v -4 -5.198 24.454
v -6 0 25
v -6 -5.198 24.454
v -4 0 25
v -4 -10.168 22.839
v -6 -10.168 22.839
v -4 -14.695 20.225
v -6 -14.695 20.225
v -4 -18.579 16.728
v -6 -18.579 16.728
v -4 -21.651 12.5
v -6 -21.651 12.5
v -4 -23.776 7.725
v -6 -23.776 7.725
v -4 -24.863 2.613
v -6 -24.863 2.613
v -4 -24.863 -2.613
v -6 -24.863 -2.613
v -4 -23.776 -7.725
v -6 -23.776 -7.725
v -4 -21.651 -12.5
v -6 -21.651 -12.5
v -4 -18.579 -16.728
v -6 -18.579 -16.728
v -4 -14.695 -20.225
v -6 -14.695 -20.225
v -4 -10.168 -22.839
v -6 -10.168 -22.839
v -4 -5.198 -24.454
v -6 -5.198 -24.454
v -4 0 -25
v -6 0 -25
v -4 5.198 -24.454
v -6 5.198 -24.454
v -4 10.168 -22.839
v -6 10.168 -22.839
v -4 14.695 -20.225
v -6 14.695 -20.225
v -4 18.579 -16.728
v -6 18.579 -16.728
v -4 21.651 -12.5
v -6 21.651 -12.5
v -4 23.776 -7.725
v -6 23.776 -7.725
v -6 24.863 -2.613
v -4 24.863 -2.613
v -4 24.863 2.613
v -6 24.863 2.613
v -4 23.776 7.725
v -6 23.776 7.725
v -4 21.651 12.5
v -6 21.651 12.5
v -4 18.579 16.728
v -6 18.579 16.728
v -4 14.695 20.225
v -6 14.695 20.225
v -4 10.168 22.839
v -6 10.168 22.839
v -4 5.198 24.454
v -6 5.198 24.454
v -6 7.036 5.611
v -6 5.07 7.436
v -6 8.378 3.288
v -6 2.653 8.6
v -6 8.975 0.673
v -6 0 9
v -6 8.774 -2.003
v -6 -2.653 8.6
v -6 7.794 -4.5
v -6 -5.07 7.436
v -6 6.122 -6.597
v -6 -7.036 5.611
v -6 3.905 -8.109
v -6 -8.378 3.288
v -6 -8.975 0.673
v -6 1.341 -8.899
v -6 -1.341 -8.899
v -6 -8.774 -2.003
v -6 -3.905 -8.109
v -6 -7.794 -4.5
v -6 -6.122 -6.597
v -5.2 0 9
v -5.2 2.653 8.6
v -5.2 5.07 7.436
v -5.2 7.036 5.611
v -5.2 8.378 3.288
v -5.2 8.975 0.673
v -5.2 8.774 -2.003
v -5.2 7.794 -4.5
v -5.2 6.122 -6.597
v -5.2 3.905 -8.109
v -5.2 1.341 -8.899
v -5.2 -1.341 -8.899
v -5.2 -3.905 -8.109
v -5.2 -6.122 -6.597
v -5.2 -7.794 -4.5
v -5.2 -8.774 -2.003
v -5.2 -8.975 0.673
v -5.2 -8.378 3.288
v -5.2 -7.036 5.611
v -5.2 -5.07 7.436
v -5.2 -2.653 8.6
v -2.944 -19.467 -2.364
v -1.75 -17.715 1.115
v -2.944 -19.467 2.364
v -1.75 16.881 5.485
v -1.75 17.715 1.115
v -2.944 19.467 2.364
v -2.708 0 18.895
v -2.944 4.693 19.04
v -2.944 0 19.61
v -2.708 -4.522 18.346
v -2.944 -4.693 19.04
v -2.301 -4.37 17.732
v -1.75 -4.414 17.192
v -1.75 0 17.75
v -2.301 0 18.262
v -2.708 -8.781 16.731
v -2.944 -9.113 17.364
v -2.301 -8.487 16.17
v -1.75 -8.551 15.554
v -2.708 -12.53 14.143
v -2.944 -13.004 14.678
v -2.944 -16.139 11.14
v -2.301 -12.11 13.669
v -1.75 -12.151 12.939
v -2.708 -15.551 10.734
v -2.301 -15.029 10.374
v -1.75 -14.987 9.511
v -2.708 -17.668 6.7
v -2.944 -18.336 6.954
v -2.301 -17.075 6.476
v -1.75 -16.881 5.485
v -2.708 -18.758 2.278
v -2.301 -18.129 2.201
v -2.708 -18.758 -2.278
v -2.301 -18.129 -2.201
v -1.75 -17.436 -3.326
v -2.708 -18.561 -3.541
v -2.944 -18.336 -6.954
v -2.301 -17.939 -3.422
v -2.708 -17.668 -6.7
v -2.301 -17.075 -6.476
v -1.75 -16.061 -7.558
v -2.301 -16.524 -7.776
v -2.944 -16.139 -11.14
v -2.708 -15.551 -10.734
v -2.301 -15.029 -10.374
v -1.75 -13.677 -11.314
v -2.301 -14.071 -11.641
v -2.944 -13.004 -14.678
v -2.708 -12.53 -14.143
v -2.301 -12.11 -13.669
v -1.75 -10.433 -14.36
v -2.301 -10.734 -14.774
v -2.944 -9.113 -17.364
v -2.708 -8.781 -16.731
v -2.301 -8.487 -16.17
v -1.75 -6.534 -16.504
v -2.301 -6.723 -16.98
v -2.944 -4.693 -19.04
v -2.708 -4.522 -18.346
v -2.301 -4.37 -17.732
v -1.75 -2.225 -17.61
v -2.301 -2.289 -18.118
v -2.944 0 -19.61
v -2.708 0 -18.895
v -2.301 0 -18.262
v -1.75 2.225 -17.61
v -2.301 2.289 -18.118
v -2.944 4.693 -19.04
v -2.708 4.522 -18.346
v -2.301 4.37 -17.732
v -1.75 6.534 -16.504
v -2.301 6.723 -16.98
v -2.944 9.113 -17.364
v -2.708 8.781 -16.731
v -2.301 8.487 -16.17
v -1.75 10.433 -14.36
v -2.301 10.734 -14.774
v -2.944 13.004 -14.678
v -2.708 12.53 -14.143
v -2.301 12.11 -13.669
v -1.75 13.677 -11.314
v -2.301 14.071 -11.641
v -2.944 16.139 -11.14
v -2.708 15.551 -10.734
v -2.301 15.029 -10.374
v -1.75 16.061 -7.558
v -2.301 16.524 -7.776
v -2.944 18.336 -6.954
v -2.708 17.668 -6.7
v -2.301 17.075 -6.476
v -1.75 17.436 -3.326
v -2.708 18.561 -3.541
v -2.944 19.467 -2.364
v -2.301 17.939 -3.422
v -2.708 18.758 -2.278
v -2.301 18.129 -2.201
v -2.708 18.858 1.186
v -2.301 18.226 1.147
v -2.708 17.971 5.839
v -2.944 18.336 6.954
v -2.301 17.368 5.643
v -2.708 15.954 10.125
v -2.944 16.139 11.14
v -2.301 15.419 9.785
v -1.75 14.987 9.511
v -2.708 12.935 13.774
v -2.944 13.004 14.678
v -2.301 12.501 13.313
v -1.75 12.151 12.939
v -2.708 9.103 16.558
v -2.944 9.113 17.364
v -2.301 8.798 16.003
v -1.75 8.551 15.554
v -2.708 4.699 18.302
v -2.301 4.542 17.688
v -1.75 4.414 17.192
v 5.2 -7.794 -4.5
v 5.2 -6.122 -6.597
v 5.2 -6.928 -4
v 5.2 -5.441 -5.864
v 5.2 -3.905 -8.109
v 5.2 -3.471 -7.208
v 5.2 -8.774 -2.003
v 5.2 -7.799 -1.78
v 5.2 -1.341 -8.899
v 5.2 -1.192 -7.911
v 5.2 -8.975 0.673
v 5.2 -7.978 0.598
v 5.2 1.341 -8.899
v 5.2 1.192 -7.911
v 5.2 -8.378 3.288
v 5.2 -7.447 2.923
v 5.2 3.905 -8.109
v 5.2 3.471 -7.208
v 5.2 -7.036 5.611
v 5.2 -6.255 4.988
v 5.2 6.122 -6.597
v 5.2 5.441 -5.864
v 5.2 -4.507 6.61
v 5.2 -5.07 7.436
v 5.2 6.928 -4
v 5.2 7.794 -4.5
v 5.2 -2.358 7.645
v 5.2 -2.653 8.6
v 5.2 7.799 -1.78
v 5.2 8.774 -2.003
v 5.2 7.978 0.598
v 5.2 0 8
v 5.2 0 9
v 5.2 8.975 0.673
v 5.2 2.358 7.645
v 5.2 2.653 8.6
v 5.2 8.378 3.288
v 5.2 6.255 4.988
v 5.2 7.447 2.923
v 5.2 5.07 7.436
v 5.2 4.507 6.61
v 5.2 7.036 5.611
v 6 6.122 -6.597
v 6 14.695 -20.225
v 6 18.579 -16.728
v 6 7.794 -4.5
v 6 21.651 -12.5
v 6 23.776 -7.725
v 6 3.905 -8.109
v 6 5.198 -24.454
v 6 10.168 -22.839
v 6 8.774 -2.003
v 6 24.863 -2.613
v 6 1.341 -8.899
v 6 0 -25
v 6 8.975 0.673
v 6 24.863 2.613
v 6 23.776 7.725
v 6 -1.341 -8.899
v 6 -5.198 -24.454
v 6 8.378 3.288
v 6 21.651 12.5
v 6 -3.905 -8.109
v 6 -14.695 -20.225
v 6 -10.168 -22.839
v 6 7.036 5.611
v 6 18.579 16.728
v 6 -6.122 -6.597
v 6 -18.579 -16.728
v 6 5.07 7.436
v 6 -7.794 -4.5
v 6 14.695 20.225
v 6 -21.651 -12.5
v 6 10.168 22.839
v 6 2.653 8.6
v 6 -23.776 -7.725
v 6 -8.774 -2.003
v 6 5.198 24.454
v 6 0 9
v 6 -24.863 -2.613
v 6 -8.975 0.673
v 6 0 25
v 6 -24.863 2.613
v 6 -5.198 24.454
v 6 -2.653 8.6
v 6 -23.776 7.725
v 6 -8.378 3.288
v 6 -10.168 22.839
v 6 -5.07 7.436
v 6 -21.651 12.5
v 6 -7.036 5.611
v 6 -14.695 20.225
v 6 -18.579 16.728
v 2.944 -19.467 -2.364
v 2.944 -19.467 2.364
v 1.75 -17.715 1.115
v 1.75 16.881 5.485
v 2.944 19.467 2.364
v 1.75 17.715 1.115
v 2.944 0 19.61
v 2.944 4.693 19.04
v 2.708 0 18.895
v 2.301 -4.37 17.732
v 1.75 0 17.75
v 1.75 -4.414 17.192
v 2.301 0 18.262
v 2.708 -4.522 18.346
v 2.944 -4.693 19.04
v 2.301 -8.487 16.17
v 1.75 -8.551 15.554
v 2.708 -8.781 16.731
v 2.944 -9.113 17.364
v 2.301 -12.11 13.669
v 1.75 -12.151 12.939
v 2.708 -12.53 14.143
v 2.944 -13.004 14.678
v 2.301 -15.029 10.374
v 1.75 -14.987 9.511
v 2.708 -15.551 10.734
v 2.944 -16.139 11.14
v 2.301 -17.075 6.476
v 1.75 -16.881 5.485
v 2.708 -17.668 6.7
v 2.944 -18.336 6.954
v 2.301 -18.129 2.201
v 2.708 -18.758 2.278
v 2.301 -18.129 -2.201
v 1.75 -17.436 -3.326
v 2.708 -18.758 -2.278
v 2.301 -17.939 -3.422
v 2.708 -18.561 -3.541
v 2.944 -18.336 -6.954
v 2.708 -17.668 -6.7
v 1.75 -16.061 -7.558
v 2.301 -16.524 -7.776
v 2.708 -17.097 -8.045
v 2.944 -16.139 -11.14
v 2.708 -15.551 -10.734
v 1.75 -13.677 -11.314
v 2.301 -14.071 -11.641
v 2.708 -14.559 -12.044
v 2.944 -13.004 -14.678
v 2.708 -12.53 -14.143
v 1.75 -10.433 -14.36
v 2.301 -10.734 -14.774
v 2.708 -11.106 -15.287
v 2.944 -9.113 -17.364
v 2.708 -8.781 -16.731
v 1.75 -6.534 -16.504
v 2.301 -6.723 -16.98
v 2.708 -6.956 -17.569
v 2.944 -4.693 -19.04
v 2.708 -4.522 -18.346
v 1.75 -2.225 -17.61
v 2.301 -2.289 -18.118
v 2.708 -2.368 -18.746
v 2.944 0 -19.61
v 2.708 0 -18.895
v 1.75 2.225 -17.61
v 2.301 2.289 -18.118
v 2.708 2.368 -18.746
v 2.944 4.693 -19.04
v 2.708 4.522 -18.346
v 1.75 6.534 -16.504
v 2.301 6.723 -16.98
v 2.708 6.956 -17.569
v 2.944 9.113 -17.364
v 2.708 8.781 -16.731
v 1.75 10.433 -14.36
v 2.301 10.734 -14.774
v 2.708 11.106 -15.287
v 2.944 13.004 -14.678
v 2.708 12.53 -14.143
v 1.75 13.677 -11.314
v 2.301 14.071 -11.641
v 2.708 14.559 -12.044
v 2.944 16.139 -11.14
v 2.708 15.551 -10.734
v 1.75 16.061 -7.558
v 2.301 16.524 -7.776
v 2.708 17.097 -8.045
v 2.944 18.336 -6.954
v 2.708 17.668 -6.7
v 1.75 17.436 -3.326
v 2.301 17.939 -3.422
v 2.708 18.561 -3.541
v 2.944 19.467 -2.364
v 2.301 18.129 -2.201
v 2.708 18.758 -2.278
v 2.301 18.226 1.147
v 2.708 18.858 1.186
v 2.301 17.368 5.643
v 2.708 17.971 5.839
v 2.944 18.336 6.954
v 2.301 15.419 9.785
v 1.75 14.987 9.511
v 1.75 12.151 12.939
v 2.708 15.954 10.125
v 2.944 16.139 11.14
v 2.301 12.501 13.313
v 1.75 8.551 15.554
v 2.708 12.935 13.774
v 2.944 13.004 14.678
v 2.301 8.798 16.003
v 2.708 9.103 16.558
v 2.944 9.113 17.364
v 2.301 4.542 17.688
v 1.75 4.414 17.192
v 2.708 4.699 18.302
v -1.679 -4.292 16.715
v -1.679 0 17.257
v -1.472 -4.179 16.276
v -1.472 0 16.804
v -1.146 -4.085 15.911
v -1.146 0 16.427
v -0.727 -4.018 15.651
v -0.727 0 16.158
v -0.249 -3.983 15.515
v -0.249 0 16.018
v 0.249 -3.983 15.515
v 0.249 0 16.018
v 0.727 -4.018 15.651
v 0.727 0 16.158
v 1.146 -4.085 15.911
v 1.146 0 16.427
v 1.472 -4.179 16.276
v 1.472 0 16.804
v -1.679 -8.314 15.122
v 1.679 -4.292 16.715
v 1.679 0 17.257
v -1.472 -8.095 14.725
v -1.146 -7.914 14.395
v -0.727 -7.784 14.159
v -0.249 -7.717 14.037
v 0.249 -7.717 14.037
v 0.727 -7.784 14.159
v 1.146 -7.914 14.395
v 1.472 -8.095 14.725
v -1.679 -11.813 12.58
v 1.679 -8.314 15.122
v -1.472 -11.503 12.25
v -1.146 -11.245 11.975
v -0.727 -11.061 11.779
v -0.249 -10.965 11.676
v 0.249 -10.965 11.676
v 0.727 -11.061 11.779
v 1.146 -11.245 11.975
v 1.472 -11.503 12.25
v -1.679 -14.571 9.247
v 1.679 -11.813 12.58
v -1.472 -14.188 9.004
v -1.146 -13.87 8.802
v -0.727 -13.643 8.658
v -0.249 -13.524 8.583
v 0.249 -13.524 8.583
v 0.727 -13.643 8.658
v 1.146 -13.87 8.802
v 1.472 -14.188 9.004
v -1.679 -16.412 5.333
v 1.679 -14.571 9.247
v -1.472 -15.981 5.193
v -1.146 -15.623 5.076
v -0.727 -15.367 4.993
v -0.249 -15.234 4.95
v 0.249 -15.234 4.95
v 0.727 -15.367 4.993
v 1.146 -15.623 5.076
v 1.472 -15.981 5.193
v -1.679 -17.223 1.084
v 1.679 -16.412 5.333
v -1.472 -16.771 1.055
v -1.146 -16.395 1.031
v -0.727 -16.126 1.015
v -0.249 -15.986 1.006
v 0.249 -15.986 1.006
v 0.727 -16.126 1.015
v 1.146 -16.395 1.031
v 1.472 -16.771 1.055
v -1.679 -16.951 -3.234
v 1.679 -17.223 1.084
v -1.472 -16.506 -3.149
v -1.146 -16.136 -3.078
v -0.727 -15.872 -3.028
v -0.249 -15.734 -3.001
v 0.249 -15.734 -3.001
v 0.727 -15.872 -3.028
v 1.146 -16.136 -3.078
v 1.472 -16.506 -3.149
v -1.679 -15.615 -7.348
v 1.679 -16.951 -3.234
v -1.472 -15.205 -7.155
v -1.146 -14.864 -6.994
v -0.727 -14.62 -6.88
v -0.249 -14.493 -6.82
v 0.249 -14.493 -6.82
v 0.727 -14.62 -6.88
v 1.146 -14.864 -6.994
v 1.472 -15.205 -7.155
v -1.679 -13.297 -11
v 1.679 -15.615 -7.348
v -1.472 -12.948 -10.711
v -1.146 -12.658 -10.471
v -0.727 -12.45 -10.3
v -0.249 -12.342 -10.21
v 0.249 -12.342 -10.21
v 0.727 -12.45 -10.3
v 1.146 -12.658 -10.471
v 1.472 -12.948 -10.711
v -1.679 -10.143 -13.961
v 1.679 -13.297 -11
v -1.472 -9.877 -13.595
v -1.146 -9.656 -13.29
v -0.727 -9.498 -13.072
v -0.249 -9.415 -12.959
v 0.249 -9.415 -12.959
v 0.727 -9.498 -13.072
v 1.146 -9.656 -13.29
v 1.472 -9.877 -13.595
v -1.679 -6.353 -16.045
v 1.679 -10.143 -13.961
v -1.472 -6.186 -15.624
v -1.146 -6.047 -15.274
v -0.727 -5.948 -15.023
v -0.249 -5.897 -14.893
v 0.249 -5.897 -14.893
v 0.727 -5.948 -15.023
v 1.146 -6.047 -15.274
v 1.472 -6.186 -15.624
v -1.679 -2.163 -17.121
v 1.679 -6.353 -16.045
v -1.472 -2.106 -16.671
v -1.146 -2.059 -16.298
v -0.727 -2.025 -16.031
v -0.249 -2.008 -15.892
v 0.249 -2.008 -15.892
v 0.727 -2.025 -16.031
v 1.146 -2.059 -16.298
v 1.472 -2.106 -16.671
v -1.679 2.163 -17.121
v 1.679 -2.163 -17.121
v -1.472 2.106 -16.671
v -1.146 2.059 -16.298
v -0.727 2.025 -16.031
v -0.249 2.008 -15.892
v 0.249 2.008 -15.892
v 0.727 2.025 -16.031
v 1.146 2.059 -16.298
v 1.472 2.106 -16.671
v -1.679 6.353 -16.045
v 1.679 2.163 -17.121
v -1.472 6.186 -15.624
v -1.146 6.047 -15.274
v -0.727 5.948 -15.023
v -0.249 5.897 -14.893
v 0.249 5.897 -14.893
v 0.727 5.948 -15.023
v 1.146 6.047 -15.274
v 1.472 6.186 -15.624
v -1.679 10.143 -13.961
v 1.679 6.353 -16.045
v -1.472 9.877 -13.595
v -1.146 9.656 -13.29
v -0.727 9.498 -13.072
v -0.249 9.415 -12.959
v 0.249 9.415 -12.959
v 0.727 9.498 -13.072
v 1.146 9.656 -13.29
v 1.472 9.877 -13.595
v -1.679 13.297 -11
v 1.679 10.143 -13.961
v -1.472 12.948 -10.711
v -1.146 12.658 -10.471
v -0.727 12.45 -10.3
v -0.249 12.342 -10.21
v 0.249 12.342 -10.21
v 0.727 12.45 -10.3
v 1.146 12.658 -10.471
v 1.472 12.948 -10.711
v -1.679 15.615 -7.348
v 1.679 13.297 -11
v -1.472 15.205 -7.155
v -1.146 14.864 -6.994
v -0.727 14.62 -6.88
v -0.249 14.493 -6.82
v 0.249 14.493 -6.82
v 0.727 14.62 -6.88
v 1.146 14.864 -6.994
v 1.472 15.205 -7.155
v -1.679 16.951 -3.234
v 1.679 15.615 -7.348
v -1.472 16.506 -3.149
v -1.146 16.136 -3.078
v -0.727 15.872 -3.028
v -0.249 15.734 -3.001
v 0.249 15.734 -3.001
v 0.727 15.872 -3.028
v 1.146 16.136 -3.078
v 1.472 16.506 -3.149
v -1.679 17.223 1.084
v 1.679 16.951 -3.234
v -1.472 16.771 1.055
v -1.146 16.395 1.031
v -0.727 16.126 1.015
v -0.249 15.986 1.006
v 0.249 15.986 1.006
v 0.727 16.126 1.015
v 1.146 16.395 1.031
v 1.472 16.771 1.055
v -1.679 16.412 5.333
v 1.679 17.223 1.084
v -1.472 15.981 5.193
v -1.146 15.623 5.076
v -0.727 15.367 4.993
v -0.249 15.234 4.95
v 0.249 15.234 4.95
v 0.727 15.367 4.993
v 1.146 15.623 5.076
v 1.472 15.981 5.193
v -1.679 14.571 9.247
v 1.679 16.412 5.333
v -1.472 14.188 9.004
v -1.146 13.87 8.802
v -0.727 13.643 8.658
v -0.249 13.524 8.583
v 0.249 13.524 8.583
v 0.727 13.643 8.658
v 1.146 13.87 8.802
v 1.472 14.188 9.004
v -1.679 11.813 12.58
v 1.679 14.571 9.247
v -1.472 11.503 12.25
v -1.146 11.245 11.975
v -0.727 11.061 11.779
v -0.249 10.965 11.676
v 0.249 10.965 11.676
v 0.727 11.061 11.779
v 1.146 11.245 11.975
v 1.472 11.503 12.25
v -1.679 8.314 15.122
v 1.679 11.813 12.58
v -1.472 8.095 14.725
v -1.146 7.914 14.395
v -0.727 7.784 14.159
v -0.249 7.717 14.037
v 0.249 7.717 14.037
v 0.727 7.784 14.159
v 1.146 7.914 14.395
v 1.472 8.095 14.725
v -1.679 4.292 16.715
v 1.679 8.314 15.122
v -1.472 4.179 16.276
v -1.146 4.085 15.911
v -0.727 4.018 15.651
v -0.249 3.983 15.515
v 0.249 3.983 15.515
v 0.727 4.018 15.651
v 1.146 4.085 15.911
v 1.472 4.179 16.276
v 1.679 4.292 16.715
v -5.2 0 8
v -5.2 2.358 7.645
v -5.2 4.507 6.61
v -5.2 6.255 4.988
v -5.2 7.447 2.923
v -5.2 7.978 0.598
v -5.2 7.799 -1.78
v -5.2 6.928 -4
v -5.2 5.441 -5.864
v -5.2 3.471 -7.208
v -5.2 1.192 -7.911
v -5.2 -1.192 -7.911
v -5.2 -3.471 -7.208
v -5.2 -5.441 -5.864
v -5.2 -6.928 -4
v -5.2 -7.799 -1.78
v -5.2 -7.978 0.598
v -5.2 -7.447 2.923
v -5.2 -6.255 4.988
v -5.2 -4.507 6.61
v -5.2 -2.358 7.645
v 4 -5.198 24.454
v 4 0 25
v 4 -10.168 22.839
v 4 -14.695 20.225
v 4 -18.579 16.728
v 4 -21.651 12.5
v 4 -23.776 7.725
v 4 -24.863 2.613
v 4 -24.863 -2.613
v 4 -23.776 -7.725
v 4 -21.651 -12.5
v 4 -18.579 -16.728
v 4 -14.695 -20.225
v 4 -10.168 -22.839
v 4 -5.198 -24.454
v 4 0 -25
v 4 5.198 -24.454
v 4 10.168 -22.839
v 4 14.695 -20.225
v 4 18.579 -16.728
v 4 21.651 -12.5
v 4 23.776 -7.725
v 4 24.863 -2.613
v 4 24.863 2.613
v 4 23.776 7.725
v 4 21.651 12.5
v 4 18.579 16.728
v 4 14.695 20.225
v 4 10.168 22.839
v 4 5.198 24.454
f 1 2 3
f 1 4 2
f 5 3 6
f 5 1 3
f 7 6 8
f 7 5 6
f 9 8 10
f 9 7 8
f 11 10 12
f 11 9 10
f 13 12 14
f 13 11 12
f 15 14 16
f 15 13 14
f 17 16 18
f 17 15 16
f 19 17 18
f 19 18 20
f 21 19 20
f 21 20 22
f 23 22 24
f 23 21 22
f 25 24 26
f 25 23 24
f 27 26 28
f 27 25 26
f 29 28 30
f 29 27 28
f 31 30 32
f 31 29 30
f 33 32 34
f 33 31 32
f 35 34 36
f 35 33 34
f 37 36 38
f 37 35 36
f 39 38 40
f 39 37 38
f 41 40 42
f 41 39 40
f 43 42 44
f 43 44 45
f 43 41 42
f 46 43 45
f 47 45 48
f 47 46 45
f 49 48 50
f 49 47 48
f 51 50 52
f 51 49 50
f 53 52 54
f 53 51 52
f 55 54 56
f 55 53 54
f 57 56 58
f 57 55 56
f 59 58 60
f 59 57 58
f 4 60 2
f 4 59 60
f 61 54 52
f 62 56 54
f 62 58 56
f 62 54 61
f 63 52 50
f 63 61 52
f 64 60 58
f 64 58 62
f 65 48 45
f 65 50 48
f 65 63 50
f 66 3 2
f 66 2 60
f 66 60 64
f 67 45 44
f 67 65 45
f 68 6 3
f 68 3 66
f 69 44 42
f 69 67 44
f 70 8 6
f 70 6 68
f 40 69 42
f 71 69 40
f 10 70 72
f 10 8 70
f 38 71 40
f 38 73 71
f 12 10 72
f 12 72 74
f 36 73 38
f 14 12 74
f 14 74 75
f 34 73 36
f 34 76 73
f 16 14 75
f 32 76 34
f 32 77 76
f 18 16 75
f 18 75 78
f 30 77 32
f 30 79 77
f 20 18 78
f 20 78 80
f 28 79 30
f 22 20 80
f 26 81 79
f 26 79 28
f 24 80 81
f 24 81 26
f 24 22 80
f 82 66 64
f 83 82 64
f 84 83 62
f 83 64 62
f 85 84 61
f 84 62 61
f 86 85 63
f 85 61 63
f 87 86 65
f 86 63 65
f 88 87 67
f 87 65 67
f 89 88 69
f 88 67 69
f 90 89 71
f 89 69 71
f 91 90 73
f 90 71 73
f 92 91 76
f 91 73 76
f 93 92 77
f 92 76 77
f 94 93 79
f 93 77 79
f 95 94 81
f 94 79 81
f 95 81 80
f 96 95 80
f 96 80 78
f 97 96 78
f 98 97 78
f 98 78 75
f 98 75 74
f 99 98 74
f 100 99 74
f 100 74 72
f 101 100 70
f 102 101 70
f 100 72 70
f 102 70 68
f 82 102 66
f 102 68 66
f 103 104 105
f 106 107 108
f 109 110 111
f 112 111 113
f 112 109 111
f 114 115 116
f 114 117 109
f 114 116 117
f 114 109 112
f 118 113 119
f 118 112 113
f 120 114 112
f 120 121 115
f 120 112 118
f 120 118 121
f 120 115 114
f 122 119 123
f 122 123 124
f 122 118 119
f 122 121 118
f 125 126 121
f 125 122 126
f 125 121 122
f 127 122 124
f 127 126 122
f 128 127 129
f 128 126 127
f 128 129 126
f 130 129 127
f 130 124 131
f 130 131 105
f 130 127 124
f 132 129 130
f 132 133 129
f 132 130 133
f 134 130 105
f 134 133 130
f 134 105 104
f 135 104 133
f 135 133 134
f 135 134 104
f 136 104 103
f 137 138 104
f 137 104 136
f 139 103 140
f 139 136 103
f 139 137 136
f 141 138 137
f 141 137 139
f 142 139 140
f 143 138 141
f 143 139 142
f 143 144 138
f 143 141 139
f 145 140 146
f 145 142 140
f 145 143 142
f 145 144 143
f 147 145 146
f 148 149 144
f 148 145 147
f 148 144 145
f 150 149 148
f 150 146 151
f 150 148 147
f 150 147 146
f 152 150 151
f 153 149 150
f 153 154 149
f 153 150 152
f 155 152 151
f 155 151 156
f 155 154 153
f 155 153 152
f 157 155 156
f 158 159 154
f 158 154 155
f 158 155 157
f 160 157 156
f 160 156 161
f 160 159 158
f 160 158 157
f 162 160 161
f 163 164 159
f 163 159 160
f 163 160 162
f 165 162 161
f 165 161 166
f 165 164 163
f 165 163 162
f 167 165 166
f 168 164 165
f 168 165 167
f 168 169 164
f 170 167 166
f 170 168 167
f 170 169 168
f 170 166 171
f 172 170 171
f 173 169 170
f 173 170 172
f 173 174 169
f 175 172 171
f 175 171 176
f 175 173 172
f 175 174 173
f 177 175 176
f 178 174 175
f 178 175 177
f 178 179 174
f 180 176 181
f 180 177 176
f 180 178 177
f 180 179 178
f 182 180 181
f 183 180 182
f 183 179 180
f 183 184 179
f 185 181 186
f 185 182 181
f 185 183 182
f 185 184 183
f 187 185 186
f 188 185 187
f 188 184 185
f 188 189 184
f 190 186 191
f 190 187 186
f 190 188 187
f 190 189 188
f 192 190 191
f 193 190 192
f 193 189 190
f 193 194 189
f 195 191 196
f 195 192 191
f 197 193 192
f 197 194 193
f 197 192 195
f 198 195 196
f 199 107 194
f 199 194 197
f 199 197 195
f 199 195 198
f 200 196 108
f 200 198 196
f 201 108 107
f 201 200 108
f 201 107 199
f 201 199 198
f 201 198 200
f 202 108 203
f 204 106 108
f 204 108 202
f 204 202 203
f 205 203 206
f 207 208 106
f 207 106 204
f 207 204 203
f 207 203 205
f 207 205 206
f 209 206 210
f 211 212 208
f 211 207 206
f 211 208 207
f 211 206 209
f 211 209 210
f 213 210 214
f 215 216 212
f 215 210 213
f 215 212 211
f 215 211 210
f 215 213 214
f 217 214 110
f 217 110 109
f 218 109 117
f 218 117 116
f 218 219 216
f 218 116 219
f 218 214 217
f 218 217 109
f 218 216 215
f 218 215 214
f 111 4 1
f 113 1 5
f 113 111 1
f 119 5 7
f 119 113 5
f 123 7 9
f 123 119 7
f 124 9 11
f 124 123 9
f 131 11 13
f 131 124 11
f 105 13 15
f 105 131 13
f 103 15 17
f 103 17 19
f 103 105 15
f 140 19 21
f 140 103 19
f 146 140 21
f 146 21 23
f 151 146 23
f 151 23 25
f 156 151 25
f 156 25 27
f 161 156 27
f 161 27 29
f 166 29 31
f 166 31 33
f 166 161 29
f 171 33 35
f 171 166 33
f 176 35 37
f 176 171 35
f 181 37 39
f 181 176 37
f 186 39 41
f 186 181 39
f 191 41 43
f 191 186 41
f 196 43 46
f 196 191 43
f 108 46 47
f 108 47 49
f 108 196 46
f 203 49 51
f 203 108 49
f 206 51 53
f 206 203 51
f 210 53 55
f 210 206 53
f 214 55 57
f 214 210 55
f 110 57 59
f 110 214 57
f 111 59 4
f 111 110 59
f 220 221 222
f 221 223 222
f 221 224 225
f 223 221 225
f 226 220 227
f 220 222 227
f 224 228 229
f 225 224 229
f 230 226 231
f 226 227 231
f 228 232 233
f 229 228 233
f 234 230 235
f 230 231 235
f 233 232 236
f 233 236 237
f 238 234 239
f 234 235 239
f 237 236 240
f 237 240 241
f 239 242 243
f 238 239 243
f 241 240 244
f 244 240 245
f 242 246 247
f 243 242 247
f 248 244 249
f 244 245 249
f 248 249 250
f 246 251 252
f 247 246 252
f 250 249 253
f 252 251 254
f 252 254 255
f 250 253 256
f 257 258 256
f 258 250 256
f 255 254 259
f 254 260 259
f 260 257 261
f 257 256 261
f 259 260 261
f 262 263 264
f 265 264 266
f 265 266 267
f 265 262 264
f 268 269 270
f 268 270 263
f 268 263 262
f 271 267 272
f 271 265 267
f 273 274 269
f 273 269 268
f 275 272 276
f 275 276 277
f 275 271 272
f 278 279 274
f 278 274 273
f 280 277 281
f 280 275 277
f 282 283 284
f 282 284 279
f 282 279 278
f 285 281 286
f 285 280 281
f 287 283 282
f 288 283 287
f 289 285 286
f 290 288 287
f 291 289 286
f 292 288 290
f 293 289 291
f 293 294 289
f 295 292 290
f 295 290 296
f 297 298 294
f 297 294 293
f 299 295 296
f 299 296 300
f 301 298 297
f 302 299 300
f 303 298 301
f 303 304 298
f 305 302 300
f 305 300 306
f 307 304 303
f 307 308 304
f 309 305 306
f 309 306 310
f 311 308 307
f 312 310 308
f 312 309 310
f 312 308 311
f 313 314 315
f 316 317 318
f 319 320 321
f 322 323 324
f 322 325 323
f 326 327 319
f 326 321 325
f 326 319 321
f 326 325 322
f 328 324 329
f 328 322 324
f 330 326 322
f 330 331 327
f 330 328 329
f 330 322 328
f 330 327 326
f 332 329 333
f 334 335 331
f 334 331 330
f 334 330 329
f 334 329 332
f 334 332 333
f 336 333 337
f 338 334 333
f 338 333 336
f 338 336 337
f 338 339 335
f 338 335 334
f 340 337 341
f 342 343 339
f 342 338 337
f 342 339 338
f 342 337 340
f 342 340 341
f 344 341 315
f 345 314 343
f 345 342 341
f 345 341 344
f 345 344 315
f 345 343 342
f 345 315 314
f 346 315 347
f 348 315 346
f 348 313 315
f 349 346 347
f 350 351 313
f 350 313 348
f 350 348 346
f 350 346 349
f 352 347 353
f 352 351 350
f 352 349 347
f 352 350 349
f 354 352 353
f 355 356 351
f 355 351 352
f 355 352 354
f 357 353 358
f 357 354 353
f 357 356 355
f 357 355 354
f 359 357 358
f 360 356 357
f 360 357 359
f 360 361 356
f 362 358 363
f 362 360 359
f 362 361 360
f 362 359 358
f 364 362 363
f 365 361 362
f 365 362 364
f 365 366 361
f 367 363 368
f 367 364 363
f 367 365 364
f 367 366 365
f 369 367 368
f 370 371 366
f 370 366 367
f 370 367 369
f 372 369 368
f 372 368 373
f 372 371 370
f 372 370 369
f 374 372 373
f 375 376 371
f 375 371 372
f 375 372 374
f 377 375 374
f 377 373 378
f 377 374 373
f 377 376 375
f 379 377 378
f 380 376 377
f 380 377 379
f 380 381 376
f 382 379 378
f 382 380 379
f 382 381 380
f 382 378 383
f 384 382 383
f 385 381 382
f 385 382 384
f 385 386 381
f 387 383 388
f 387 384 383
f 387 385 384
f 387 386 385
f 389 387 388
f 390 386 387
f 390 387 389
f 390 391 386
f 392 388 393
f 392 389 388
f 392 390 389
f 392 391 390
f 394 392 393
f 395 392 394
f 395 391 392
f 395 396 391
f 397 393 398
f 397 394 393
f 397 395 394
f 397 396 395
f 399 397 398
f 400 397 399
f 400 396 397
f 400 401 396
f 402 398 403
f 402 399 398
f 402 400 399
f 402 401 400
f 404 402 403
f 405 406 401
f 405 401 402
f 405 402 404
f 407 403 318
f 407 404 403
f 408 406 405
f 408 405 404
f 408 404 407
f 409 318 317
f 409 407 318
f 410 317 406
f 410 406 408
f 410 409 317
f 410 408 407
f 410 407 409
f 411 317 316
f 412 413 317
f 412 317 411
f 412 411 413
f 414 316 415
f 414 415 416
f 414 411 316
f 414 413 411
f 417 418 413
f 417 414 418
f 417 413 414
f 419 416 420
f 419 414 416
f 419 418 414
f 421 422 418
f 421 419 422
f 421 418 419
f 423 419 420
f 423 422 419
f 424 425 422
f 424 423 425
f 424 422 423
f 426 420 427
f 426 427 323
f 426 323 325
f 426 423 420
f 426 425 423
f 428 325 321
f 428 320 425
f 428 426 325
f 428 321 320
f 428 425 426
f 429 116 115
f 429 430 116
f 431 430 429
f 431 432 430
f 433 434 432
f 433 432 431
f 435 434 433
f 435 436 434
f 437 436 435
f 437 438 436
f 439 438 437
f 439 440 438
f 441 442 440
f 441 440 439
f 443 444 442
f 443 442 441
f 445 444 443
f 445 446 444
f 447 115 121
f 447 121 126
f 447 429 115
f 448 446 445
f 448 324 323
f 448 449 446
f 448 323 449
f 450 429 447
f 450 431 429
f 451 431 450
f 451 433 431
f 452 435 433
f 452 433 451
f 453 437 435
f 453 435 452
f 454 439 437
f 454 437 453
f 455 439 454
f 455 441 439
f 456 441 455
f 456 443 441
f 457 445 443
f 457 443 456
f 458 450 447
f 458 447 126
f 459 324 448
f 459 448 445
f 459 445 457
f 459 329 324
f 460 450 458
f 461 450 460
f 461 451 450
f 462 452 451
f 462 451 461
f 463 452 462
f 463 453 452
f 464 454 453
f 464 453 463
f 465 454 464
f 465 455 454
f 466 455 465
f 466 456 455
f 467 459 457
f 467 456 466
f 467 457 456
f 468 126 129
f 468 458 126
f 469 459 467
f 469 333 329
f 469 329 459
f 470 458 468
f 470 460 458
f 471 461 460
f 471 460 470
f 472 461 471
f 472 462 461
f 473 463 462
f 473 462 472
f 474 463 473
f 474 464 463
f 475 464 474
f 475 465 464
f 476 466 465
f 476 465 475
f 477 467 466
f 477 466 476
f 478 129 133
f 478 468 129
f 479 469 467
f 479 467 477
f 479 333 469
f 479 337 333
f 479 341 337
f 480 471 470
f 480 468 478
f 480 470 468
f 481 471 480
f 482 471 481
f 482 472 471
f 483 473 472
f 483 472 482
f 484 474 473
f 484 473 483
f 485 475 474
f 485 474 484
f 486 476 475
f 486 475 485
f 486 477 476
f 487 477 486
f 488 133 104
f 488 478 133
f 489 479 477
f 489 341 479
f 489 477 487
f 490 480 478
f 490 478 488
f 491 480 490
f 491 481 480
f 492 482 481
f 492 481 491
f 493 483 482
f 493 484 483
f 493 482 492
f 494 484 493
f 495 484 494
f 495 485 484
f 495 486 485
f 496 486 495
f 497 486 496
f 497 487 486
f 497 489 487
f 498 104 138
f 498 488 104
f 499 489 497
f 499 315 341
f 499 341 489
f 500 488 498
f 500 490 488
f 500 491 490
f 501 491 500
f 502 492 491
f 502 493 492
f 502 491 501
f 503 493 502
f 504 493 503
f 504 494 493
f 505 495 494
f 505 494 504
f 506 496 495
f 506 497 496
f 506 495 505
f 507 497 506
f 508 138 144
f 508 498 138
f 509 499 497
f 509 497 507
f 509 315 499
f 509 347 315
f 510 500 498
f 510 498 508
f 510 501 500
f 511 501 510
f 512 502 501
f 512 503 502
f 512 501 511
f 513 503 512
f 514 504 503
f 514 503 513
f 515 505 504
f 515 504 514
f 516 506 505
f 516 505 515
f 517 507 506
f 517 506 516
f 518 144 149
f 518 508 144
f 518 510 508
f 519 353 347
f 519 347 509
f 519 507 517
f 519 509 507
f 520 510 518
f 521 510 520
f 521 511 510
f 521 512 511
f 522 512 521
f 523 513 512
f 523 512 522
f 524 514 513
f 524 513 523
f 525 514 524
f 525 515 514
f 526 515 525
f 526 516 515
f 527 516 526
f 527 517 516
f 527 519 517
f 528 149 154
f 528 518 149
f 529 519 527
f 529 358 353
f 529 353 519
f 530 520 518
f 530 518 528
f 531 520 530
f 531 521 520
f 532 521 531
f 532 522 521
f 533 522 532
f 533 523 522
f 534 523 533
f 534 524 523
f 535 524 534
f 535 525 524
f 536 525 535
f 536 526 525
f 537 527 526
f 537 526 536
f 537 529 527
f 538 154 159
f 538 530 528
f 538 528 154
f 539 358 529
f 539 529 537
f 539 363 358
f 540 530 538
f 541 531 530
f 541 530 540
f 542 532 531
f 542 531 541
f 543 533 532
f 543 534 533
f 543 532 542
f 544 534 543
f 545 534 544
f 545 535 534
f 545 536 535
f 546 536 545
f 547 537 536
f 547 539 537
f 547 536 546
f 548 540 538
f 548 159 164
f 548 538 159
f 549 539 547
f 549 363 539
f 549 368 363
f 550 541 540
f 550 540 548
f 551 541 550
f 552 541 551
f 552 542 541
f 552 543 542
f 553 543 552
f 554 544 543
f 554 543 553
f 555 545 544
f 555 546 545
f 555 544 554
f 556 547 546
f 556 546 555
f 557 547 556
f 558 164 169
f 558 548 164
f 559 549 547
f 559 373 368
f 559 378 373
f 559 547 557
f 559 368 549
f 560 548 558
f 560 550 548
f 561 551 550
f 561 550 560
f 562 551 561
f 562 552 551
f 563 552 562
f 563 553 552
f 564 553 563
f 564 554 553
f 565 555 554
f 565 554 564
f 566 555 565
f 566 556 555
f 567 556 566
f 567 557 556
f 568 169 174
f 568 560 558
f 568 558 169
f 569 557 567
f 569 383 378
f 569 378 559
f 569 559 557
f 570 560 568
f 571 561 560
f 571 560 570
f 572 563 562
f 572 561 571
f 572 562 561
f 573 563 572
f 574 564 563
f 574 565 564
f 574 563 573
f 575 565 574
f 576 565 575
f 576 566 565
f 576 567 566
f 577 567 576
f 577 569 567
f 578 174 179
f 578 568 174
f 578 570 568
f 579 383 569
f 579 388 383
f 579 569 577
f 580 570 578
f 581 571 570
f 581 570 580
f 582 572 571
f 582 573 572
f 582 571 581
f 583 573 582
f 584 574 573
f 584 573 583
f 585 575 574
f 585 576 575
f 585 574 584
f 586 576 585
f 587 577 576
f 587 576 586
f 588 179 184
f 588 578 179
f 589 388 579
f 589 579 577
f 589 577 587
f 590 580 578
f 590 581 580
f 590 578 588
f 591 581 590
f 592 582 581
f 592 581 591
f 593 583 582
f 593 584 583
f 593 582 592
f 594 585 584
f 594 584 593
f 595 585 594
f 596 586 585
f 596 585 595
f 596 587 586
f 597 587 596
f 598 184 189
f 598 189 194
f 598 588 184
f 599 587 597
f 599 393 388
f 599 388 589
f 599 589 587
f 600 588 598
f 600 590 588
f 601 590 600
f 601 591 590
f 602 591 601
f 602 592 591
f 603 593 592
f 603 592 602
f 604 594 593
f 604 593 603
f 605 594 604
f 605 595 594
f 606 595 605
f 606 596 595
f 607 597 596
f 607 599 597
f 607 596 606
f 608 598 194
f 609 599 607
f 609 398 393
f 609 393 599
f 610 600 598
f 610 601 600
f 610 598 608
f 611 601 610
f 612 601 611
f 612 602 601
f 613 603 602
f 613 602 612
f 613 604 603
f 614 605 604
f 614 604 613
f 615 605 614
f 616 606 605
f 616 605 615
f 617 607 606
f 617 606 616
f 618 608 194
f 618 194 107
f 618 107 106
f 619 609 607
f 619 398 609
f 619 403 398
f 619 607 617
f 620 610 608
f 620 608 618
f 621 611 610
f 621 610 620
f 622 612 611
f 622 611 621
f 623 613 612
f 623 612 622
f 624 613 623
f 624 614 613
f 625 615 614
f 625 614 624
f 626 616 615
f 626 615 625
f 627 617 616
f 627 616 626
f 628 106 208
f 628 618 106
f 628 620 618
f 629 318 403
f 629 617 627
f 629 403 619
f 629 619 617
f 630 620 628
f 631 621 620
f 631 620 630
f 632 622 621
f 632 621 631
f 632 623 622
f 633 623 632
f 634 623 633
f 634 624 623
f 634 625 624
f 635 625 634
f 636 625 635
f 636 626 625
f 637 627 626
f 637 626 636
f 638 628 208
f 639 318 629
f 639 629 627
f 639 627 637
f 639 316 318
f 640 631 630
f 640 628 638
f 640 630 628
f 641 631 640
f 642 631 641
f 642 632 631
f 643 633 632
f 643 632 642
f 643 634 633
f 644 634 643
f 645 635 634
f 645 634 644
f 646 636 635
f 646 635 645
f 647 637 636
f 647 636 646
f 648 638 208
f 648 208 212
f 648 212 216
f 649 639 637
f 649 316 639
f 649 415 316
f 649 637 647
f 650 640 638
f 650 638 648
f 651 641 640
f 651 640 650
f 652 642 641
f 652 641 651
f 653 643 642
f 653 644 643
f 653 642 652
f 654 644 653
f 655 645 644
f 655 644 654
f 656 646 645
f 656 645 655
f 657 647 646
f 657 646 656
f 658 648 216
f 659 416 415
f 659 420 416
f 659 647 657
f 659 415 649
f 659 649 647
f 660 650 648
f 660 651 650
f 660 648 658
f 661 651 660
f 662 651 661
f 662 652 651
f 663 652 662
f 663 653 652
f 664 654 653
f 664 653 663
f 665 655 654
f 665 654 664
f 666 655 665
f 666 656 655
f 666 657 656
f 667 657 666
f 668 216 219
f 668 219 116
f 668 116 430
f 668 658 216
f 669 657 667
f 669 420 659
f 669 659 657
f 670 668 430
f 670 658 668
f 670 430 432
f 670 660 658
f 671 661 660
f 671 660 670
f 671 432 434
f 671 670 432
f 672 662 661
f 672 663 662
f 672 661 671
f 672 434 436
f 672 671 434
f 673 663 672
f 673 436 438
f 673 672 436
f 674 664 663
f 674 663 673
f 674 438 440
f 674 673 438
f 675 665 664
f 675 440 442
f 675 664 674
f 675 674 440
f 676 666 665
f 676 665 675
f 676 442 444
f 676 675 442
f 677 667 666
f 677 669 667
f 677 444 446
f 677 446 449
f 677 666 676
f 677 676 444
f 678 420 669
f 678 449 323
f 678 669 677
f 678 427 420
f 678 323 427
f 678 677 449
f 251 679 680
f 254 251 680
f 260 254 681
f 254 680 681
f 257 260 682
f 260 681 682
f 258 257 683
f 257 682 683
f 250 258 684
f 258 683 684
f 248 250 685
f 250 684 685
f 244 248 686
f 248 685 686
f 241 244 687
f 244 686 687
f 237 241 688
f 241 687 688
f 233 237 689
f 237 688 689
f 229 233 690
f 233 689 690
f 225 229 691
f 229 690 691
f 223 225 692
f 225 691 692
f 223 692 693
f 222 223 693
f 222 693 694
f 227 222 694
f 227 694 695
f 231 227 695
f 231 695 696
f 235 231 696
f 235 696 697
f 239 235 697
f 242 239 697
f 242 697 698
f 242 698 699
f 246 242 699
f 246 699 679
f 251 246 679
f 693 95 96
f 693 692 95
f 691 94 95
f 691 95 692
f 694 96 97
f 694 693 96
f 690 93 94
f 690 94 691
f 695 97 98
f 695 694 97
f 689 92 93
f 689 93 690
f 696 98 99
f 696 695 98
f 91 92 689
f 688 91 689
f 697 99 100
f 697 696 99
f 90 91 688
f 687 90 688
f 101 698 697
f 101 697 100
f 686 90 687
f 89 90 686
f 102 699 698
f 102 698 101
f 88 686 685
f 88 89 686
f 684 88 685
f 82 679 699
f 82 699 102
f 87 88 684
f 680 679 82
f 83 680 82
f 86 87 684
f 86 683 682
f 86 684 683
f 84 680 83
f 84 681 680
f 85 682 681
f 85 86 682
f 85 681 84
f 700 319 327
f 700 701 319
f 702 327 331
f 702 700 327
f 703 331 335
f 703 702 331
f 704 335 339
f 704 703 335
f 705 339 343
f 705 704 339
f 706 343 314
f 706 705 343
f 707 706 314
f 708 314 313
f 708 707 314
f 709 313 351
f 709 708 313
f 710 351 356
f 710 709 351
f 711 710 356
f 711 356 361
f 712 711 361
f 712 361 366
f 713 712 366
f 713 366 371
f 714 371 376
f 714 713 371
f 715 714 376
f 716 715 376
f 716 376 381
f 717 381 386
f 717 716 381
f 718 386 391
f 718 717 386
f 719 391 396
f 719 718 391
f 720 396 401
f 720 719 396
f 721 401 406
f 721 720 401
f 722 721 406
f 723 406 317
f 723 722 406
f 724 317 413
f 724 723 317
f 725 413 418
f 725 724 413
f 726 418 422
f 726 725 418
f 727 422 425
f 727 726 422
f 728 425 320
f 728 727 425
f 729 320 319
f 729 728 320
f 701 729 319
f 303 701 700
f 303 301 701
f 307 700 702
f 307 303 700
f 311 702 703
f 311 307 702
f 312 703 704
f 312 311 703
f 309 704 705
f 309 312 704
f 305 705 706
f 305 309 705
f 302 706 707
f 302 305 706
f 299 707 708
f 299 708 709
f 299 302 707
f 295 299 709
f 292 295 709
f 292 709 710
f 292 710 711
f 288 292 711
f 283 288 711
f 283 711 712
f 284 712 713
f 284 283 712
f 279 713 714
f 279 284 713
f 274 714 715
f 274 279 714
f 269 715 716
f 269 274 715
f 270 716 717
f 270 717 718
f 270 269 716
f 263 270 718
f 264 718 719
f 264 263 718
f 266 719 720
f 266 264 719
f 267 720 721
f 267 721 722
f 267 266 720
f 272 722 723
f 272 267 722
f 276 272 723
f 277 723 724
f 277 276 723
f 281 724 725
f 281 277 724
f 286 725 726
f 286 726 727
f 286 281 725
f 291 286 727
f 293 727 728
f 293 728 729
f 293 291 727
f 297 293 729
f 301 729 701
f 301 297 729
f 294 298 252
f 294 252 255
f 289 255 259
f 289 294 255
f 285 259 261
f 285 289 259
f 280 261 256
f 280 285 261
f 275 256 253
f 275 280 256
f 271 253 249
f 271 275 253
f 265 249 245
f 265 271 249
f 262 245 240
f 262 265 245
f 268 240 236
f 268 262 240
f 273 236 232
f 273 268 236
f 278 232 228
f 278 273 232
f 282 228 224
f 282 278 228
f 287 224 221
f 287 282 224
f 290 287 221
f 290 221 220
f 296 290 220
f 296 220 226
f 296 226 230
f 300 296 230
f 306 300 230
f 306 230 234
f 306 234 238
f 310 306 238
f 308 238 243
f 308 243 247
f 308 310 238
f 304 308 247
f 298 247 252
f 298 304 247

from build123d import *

# Parameters (mm, degrees)
SKETCH_4_R          = 8
CUT_EXTRUDE_1_DEPTH = 38.336309405
SKETCH_5_R          = 9
CUT_EXTRUDE_2_DEPTH = 0.8


with BuildPart() as part:
    # Эскиз1 → Повернуть1 (revolve)
    with BuildSketch(Plane.XY, mode=Mode.PRIVATE) as revolve_1_sk:
        with BuildLine():
            Line((-4, 25), (-2.94403514, 19.609934257))
            ThreePointArc((-2.94403514, 19.609934257), (-2.52454557, 18.565998224), (-1.75, 17.75))
            ThreePointArc((-1.75, 17.75), (0, 16), (1.75, 17.75))
            ThreePointArc((1.75, 17.75), (2.52454557, 18.565998224), (2.94403514, 19.609934257))
            Line((2.94403514, 19.609934257), (4, 25))
            Line((4, 25), (6, 25))
            Line((6, 25), (6, 0))
            Line((6, 0), (-6, 0))
            Line((-6, 0), (-6, 25))
            Line((-6, 25), (-4, 25))
        make_face()
    revolve(revolve_1_sk.sketch.rotate(Axis((-6, 0, 0), (1, 0, 0)), 90), axis=Axis((-6, 0, 0), (1, 0, 0)))

    # Эскиз4 → Вырез-Вытянуть1 (cut, through all)
    with BuildSketch(Plane.ZY.offset(6)):
        Circle(SKETCH_4_R)
    extrude(amount=-CUT_EXTRUDE_1_DEPTH, mode=Mode.SUBTRACT)

    # Эскиз5 → Вырез-Вытянуть2 (cut)
    with BuildSketch(Plane.ZY.offset(6)):
        Circle(SKETCH_5_R)
    cut_extrude_2 = extrude(amount=-CUT_EXTRUDE_2_DEPTH, mode=Mode.SUBTRACT)

    # Зеркальное отражение1: Вырез-Вытянуть2 across plane
    add(cut_extrude_2.mirror(Plane(origin=(0, 0, 0), x_dir=(0, 0, 1), z_dir=(1, 0, 0))), mode=Mode.SUBTRACT)


solid = part.part
